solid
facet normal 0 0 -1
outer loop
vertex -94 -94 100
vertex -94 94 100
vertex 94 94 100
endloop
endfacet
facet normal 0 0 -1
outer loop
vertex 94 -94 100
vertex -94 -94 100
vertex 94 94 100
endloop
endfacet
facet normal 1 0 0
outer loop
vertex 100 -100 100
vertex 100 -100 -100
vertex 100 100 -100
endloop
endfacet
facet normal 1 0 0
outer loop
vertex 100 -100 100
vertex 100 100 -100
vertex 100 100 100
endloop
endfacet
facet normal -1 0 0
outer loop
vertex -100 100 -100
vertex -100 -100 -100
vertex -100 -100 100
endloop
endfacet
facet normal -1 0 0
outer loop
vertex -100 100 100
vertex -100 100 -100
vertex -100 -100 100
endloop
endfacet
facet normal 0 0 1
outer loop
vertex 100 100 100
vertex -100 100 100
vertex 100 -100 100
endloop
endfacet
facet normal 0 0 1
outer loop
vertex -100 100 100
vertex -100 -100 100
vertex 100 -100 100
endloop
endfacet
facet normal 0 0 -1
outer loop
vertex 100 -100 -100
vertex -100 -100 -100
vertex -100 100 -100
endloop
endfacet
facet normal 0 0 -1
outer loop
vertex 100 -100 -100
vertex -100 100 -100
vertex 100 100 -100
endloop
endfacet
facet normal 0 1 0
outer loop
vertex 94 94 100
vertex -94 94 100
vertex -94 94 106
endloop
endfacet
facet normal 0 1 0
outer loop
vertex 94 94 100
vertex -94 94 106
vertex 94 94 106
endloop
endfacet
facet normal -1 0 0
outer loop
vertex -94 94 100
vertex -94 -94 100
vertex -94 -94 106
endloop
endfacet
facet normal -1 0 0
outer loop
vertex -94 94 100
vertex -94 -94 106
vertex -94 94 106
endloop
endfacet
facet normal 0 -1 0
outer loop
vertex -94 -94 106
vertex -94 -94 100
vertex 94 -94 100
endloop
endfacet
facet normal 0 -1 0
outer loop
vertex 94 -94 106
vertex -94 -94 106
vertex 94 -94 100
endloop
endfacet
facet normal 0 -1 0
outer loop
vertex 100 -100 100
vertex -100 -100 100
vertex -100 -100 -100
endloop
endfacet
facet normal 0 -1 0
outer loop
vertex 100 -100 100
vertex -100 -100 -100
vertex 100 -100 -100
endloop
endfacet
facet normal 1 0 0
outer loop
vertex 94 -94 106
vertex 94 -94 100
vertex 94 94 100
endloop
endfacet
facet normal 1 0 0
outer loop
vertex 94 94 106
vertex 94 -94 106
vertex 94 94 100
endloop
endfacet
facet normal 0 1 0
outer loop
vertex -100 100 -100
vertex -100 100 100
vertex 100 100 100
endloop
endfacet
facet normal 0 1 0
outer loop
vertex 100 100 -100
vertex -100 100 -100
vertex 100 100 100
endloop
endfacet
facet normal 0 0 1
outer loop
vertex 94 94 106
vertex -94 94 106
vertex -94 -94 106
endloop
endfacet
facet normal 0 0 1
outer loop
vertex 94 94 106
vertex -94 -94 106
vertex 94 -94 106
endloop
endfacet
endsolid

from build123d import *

# Parameters (mm, degrees)
F0_W     = 200
F0_H     = 200
F1_DEPTH = 100
F2_W     = 188
F2_H     = 188
F3_DEPTH = 6


with BuildPart() as f1:
    # F0 (on Front) → F1 (new body, symmetric)
    with BuildSketch(Plane.XZ):
        Rectangle(F0_W, F0_H)
    extrude(amount=F1_DEPTH, both=True)


with BuildPart() as f3:
    # F2 (on face) → F3 (new body)
    with BuildSketch(Plane.XY.offset(100)):
        Rectangle(F2_W, F2_H)
    extrude(amount=F3_DEPTH)


solid = Compound([f1.part, f3.part])
